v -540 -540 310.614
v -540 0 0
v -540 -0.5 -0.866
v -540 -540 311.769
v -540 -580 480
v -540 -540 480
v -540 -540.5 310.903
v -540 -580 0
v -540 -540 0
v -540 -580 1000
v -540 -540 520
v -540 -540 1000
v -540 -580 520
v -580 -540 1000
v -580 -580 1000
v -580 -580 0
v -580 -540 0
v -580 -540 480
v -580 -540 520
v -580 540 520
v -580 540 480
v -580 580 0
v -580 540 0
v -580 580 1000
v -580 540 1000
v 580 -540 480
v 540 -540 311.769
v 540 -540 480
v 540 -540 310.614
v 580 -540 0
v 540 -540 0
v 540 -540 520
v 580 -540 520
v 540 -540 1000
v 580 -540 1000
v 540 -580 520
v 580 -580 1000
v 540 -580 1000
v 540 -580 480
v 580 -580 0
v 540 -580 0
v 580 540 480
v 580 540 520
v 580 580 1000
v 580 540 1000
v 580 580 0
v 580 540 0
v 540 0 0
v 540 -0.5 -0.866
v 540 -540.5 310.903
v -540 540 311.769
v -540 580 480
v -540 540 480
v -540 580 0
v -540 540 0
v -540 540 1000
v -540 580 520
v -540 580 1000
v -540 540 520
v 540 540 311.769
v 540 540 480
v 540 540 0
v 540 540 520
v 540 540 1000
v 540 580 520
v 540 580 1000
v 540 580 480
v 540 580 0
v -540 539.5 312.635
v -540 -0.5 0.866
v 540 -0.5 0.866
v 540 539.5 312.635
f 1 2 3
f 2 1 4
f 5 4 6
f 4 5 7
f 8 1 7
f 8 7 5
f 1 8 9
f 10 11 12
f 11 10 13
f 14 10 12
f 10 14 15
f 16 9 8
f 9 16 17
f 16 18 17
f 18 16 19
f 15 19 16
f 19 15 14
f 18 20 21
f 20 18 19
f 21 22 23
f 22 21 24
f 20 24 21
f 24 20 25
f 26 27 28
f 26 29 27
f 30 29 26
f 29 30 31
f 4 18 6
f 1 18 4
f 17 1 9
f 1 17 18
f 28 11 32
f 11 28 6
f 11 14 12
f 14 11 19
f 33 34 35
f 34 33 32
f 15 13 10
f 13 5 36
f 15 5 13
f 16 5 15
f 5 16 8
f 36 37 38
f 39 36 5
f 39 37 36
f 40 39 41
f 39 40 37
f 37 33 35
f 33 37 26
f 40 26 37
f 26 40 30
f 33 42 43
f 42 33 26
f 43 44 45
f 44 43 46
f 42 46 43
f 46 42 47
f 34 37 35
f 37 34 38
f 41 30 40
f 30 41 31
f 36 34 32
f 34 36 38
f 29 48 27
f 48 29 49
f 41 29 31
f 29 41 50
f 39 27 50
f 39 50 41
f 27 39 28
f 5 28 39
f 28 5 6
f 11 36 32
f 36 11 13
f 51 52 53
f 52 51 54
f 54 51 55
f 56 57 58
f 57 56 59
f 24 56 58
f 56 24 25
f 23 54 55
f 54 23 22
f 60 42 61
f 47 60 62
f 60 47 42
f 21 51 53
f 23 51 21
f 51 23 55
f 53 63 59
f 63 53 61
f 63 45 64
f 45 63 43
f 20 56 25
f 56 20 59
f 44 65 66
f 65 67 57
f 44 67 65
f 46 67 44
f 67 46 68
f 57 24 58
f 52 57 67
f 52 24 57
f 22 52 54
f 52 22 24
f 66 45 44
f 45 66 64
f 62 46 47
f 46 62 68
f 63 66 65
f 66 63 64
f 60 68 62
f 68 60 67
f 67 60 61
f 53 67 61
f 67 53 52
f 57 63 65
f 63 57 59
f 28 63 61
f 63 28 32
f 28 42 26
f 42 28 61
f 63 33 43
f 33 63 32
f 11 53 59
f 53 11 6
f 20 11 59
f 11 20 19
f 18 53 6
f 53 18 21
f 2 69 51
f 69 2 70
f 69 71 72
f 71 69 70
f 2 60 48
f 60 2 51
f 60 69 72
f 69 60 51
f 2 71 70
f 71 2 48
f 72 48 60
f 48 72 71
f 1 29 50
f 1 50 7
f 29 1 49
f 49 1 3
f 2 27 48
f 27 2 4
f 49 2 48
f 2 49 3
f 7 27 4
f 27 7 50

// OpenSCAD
$fs=$fs/4;
$fa=$fa/4;

r = 2.6;
carre_l = 40;

dh=40;

ouverture = 200;
l = 1000+2*carre_l;
lg = 1000+2*carre_l;
h = 1000;
h2 = 400;

cone_l = 600;
cone_a = 36;

ouverture = 200;
/*l = 1000-2*carre_l;
lg = 1000-2*carre_l;
h = 1000;
h2 = 300;

cone_l = 470;
cone_a = 40;*/

/*ouverture = 150;
l = 1150;
lg = 1150;
h = 1050;
h2 = 450;

cone_l = 650;
cone_a = 40;*/

h3 = h-h2-dh;


module tole(){
    rotate([0,0,0]) hull(){
        translate ([-ouverture/2, 0,0]) cube([ouverture,1,1]);
        translate ([-l/2, cone_l,0]) cube([l,1,1]);
        
    }
}



module tole_plie(b){
    translate([-l/2, 0, 0])cube([l,h3,1]);
    difference(){
        translate([l/2, 40, 0])cube([50,600-70,1]);
        translate([l/2+20, 70, 0])cylinder(r=5,300, center = true);
        translate([l/2+20, 300, 0])cylinder(r=5,300, center = true);
        translate([l/2+20, 540, 0])cylinder(r=5,300, center = true);
    }
    translate([-l/2, 0, 0]) rotate([0,b*-90,0]) translate([-50,0,0])cube([50,600,1]);
    rotate([b*(90-cone_a),0,0]){
        translate([0, -cone_l, 0])tole();
        translate([100, -cone_l, 0]) rotate([0, 50*b, -38]) 
            translate([0, 100, 0]) cube([50,600,1]);
    }
    if(!b){
        %translate([-500, -cone_l, 0])cube([1000,2000,1]);
        translate([-500, h3, 0])cube([1000,h3,1]);
    }
}

module barre(l){
    cube([carre_l, carre_l, l]);
}

module barre2(l){
    translate([-100,0,0])cube([200,l,  100]);
}

module barre3(l){
    translate([0,0,0])cube([30,30, l]);
}

module tole_plie(){
    angle = 30;
    plie_l = l/cos(angle)/2;
    translate([-l/2, 0,0]) rotate([angle,0,0])cube([l,plie_l,1]);;
    translate([-l/2, 0,0]) rotate([180-angle,0,0])cube([l,plie_l,1]);;
    
}

module caisson2(){
    for(i=[0,1]){
        mirror([0,i,0])union(){
            translate([-l/2-carre_l, -lg/2-carre_l,0])  barre(h);
            translate([ l/2, -lg/2-carre_l, 0])  barre(h);
            translate([ l/2, -lg/2-carre_l, h/2-carre_l/2])  rotate([0,-90,0])barre(lg);
        }
        
        mirror([i,0,0])union(){
            translate([ l/2, -lg/2, h/2+carre_l/2])  rotate([-90,0,0])barre(lg);
        }
    }
    
     
    
    
    for(i=[0,90,180,270]){
        //color("blue")
        %rotate([90,0,i]) translate ([-l/2, 0,l/2-2]) cube([l,lg,1]);
    }
    tole_plie();
    
    
    
}

mode=0;
if(mode ==0){
    caisson2();
} else {
    tole_plie(0);
}

v = l*lg*h3/1000000;
v2 = l*lg*h2/3/1000000;
v3 = v+v2;
echo("l", l, " lg ", lg, " h ", h);
echo("volume", v3, " pd ", (v3*0.7));
echo("hauteur",(h3/10), " conne l", cone_l/10);
